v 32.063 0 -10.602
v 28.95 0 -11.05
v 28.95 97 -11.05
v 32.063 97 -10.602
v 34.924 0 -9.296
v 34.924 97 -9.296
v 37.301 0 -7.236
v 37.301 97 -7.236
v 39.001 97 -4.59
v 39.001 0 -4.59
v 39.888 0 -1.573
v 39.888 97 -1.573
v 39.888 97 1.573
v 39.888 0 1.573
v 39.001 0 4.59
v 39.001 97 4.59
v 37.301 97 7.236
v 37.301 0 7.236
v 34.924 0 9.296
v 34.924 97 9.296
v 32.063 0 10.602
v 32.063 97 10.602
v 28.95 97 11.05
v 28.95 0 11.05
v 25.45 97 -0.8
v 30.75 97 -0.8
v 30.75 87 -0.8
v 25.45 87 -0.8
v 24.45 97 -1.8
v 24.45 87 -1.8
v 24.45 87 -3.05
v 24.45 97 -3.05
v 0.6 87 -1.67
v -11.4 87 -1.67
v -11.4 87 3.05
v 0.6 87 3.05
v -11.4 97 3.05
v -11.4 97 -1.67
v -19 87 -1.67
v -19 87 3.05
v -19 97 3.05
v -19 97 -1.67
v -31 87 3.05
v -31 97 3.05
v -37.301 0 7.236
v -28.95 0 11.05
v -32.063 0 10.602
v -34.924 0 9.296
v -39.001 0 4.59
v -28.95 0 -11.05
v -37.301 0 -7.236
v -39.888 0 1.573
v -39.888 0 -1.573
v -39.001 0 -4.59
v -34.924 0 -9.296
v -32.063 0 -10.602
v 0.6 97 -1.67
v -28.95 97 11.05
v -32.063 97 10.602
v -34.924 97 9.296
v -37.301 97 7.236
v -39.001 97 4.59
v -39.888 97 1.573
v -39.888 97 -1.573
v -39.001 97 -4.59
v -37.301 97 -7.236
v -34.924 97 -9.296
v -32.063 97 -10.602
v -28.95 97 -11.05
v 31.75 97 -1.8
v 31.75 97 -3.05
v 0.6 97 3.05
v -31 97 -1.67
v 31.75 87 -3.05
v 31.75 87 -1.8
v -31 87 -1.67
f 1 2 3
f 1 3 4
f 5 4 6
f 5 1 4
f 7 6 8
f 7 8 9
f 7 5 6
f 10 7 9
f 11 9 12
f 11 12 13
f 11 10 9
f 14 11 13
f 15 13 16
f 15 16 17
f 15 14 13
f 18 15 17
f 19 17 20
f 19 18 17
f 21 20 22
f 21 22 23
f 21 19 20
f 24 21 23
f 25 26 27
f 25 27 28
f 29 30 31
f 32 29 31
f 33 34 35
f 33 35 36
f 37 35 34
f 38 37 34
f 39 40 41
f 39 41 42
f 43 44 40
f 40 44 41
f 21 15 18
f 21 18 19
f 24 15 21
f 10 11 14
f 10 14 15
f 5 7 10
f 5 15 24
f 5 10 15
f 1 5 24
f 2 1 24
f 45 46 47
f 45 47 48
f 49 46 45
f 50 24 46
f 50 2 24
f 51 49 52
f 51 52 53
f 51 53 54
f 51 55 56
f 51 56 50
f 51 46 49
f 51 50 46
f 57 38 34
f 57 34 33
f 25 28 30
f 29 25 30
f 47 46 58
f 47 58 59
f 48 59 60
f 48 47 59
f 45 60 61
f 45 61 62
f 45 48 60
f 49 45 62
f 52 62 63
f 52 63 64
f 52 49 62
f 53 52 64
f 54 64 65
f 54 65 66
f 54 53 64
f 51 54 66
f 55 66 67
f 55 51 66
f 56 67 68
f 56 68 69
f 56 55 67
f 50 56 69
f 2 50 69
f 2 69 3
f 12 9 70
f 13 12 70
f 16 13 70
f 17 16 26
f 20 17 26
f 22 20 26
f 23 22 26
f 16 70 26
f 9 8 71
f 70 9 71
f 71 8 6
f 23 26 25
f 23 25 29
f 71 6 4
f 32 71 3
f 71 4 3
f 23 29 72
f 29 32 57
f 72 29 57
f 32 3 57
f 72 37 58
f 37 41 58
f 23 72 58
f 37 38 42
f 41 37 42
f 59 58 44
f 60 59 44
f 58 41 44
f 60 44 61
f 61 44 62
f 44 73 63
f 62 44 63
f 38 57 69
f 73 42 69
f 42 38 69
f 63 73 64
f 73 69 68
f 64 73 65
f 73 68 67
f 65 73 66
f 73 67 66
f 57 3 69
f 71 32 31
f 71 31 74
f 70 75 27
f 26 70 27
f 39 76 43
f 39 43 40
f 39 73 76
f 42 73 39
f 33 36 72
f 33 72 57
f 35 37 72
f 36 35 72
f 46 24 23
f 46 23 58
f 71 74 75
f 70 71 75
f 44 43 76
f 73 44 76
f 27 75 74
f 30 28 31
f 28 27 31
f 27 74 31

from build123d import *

# Parameters (mm, degrees)
BOSS_EXTRUDE1_DEPTH = 97
SKETCH2_W           = 12
SKETCH2_H           = 4.72
CUT_EXTRUDE1_DEPTH  = 10


with BuildPart() as part:
    # Sketch1 → Boss-Extrude1 (new body)
    with BuildSketch(Plane(origin=(0, 0, 0), x_dir=(1, 0, 0), z_dir=(0, 1, 0))):
        with BuildLine():
            Line((-28.95, 11.05), (28.95, 11.05))
            ThreePointArc((28.95, 11.05), (40, 0), (28.95, -11.05))
            Line((28.95, -11.05), (-28.95, -11.05))
            ThreePointArc((-28.95, -11.05), (-40, 0), (-28.95, 11.05))
        make_face()
    extrude(amount=BOSS_EXTRUDE1_DEPTH)

    # Sketch2 → Cut-Extrude1 (cut)
    with BuildSketch(Plane(origin=(0, 97, 0), x_dir=(1, 0, 0), z_dir=(0, 1, 0))):
        with Locations((-25, -0.69)):
            Rectangle(SKETCH2_W, SKETCH2_H)
        with Locations((-5.4, -0.69)):
            Rectangle(SKETCH2_W, SKETCH2_H)
        Polygon((25.45, 0.8), (24.45, 1.8), (24.45, 3.05), (31.75, 3.05), (31.75, 1.8), (30.75, 0.8), align=None)
    extrude(amount=-CUT_EXTRUDE1_DEPTH, mode=Mode.SUBTRACT)


solid = part.part
